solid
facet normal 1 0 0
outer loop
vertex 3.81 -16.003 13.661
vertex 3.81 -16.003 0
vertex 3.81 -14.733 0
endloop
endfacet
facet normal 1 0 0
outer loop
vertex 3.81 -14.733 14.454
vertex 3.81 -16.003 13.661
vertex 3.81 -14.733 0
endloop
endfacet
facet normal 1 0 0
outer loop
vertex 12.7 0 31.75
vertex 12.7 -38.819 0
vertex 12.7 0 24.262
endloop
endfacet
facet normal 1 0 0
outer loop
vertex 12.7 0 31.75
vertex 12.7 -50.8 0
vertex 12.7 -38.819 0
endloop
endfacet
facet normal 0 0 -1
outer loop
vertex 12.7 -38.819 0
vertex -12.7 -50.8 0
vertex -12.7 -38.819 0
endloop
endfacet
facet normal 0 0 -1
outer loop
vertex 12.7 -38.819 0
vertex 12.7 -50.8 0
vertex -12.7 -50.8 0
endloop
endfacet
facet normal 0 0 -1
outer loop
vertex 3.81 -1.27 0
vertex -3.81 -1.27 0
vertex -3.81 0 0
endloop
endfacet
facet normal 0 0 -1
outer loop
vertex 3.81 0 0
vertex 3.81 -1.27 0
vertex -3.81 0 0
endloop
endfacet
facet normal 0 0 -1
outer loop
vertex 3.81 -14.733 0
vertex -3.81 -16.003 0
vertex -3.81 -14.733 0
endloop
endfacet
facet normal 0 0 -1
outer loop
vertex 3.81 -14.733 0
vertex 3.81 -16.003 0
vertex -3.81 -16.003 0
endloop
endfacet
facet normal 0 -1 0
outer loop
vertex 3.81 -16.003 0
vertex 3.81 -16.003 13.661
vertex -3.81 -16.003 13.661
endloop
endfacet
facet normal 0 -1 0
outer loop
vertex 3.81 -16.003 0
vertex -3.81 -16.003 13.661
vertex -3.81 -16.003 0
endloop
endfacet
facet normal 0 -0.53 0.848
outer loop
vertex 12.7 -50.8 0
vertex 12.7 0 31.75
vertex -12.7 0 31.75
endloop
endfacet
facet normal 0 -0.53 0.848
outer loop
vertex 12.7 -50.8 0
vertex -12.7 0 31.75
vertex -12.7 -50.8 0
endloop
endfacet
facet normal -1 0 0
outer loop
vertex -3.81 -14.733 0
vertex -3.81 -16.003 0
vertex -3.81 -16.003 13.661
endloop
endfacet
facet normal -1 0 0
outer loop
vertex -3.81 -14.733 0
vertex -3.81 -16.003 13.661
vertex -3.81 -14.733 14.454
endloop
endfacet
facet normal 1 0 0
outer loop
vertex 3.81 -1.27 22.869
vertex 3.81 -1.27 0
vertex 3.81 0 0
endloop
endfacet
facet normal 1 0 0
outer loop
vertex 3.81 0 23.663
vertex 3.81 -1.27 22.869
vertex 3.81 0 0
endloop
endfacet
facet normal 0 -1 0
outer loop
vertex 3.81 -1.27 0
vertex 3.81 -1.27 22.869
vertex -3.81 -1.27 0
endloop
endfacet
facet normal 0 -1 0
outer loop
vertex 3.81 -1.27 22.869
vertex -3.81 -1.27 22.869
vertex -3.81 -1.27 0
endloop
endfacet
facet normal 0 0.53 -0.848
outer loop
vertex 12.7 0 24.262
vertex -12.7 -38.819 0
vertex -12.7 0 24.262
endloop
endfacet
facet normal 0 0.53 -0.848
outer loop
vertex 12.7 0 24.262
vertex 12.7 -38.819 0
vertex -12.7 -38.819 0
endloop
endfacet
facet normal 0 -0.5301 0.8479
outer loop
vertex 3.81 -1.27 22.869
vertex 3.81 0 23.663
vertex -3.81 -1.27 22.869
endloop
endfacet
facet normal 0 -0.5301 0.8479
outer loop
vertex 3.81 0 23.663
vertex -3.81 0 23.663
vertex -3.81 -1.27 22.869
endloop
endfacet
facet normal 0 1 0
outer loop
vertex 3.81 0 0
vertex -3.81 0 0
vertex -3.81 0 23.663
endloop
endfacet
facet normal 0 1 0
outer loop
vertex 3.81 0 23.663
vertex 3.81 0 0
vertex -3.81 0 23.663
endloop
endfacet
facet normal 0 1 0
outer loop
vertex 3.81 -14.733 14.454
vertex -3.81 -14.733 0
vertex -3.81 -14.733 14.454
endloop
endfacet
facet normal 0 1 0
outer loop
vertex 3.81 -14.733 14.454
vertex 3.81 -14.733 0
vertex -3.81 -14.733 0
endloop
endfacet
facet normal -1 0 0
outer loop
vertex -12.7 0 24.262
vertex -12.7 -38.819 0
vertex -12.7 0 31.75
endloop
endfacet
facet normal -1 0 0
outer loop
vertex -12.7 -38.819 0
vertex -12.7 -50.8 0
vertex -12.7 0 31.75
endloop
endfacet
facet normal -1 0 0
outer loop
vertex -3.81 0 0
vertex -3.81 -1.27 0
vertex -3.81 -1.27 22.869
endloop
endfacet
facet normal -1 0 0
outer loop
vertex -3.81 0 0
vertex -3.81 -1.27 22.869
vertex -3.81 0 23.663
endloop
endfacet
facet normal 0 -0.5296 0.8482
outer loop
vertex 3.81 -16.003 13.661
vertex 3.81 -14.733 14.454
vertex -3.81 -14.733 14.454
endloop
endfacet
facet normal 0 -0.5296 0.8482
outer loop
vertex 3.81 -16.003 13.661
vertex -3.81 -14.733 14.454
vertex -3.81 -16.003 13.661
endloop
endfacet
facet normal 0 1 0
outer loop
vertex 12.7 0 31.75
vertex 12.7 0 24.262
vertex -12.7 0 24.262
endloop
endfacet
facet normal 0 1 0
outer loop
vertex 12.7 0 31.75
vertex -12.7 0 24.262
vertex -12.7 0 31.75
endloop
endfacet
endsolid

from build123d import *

# Parameters (mm, degrees)
F2_DEPTH = 12.7
F3_DEPTH = 3.81


with BuildPart() as f2:
    # F0 (on Right) → F2 (new body, symmetric)
    with BuildSketch(Plane.YZ):
        Polygon((-38.818844, 0), (0, 24.261778), (0, 31.75), (-50.8, 0), align=None)
    extrude(amount=F2_DEPTH, both=True)


with BuildPart() as f3:
    # F1 (on Right) → F3 (new body, symmetric)
    with BuildSketch(Plane.YZ):
        Polygon((0, 0), (0, 23.66272), (-1.27, 22.86897), (-1.27, 0), align=None)
        Polygon((-14.733193, 0), (-14.733193, 14.454474), (-16.003193, 13.660724), (-16.003193, 0), align=None)
    extrude(amount=F3_DEPTH, both=True)


solid = Compound([f2.part, f3.part])
